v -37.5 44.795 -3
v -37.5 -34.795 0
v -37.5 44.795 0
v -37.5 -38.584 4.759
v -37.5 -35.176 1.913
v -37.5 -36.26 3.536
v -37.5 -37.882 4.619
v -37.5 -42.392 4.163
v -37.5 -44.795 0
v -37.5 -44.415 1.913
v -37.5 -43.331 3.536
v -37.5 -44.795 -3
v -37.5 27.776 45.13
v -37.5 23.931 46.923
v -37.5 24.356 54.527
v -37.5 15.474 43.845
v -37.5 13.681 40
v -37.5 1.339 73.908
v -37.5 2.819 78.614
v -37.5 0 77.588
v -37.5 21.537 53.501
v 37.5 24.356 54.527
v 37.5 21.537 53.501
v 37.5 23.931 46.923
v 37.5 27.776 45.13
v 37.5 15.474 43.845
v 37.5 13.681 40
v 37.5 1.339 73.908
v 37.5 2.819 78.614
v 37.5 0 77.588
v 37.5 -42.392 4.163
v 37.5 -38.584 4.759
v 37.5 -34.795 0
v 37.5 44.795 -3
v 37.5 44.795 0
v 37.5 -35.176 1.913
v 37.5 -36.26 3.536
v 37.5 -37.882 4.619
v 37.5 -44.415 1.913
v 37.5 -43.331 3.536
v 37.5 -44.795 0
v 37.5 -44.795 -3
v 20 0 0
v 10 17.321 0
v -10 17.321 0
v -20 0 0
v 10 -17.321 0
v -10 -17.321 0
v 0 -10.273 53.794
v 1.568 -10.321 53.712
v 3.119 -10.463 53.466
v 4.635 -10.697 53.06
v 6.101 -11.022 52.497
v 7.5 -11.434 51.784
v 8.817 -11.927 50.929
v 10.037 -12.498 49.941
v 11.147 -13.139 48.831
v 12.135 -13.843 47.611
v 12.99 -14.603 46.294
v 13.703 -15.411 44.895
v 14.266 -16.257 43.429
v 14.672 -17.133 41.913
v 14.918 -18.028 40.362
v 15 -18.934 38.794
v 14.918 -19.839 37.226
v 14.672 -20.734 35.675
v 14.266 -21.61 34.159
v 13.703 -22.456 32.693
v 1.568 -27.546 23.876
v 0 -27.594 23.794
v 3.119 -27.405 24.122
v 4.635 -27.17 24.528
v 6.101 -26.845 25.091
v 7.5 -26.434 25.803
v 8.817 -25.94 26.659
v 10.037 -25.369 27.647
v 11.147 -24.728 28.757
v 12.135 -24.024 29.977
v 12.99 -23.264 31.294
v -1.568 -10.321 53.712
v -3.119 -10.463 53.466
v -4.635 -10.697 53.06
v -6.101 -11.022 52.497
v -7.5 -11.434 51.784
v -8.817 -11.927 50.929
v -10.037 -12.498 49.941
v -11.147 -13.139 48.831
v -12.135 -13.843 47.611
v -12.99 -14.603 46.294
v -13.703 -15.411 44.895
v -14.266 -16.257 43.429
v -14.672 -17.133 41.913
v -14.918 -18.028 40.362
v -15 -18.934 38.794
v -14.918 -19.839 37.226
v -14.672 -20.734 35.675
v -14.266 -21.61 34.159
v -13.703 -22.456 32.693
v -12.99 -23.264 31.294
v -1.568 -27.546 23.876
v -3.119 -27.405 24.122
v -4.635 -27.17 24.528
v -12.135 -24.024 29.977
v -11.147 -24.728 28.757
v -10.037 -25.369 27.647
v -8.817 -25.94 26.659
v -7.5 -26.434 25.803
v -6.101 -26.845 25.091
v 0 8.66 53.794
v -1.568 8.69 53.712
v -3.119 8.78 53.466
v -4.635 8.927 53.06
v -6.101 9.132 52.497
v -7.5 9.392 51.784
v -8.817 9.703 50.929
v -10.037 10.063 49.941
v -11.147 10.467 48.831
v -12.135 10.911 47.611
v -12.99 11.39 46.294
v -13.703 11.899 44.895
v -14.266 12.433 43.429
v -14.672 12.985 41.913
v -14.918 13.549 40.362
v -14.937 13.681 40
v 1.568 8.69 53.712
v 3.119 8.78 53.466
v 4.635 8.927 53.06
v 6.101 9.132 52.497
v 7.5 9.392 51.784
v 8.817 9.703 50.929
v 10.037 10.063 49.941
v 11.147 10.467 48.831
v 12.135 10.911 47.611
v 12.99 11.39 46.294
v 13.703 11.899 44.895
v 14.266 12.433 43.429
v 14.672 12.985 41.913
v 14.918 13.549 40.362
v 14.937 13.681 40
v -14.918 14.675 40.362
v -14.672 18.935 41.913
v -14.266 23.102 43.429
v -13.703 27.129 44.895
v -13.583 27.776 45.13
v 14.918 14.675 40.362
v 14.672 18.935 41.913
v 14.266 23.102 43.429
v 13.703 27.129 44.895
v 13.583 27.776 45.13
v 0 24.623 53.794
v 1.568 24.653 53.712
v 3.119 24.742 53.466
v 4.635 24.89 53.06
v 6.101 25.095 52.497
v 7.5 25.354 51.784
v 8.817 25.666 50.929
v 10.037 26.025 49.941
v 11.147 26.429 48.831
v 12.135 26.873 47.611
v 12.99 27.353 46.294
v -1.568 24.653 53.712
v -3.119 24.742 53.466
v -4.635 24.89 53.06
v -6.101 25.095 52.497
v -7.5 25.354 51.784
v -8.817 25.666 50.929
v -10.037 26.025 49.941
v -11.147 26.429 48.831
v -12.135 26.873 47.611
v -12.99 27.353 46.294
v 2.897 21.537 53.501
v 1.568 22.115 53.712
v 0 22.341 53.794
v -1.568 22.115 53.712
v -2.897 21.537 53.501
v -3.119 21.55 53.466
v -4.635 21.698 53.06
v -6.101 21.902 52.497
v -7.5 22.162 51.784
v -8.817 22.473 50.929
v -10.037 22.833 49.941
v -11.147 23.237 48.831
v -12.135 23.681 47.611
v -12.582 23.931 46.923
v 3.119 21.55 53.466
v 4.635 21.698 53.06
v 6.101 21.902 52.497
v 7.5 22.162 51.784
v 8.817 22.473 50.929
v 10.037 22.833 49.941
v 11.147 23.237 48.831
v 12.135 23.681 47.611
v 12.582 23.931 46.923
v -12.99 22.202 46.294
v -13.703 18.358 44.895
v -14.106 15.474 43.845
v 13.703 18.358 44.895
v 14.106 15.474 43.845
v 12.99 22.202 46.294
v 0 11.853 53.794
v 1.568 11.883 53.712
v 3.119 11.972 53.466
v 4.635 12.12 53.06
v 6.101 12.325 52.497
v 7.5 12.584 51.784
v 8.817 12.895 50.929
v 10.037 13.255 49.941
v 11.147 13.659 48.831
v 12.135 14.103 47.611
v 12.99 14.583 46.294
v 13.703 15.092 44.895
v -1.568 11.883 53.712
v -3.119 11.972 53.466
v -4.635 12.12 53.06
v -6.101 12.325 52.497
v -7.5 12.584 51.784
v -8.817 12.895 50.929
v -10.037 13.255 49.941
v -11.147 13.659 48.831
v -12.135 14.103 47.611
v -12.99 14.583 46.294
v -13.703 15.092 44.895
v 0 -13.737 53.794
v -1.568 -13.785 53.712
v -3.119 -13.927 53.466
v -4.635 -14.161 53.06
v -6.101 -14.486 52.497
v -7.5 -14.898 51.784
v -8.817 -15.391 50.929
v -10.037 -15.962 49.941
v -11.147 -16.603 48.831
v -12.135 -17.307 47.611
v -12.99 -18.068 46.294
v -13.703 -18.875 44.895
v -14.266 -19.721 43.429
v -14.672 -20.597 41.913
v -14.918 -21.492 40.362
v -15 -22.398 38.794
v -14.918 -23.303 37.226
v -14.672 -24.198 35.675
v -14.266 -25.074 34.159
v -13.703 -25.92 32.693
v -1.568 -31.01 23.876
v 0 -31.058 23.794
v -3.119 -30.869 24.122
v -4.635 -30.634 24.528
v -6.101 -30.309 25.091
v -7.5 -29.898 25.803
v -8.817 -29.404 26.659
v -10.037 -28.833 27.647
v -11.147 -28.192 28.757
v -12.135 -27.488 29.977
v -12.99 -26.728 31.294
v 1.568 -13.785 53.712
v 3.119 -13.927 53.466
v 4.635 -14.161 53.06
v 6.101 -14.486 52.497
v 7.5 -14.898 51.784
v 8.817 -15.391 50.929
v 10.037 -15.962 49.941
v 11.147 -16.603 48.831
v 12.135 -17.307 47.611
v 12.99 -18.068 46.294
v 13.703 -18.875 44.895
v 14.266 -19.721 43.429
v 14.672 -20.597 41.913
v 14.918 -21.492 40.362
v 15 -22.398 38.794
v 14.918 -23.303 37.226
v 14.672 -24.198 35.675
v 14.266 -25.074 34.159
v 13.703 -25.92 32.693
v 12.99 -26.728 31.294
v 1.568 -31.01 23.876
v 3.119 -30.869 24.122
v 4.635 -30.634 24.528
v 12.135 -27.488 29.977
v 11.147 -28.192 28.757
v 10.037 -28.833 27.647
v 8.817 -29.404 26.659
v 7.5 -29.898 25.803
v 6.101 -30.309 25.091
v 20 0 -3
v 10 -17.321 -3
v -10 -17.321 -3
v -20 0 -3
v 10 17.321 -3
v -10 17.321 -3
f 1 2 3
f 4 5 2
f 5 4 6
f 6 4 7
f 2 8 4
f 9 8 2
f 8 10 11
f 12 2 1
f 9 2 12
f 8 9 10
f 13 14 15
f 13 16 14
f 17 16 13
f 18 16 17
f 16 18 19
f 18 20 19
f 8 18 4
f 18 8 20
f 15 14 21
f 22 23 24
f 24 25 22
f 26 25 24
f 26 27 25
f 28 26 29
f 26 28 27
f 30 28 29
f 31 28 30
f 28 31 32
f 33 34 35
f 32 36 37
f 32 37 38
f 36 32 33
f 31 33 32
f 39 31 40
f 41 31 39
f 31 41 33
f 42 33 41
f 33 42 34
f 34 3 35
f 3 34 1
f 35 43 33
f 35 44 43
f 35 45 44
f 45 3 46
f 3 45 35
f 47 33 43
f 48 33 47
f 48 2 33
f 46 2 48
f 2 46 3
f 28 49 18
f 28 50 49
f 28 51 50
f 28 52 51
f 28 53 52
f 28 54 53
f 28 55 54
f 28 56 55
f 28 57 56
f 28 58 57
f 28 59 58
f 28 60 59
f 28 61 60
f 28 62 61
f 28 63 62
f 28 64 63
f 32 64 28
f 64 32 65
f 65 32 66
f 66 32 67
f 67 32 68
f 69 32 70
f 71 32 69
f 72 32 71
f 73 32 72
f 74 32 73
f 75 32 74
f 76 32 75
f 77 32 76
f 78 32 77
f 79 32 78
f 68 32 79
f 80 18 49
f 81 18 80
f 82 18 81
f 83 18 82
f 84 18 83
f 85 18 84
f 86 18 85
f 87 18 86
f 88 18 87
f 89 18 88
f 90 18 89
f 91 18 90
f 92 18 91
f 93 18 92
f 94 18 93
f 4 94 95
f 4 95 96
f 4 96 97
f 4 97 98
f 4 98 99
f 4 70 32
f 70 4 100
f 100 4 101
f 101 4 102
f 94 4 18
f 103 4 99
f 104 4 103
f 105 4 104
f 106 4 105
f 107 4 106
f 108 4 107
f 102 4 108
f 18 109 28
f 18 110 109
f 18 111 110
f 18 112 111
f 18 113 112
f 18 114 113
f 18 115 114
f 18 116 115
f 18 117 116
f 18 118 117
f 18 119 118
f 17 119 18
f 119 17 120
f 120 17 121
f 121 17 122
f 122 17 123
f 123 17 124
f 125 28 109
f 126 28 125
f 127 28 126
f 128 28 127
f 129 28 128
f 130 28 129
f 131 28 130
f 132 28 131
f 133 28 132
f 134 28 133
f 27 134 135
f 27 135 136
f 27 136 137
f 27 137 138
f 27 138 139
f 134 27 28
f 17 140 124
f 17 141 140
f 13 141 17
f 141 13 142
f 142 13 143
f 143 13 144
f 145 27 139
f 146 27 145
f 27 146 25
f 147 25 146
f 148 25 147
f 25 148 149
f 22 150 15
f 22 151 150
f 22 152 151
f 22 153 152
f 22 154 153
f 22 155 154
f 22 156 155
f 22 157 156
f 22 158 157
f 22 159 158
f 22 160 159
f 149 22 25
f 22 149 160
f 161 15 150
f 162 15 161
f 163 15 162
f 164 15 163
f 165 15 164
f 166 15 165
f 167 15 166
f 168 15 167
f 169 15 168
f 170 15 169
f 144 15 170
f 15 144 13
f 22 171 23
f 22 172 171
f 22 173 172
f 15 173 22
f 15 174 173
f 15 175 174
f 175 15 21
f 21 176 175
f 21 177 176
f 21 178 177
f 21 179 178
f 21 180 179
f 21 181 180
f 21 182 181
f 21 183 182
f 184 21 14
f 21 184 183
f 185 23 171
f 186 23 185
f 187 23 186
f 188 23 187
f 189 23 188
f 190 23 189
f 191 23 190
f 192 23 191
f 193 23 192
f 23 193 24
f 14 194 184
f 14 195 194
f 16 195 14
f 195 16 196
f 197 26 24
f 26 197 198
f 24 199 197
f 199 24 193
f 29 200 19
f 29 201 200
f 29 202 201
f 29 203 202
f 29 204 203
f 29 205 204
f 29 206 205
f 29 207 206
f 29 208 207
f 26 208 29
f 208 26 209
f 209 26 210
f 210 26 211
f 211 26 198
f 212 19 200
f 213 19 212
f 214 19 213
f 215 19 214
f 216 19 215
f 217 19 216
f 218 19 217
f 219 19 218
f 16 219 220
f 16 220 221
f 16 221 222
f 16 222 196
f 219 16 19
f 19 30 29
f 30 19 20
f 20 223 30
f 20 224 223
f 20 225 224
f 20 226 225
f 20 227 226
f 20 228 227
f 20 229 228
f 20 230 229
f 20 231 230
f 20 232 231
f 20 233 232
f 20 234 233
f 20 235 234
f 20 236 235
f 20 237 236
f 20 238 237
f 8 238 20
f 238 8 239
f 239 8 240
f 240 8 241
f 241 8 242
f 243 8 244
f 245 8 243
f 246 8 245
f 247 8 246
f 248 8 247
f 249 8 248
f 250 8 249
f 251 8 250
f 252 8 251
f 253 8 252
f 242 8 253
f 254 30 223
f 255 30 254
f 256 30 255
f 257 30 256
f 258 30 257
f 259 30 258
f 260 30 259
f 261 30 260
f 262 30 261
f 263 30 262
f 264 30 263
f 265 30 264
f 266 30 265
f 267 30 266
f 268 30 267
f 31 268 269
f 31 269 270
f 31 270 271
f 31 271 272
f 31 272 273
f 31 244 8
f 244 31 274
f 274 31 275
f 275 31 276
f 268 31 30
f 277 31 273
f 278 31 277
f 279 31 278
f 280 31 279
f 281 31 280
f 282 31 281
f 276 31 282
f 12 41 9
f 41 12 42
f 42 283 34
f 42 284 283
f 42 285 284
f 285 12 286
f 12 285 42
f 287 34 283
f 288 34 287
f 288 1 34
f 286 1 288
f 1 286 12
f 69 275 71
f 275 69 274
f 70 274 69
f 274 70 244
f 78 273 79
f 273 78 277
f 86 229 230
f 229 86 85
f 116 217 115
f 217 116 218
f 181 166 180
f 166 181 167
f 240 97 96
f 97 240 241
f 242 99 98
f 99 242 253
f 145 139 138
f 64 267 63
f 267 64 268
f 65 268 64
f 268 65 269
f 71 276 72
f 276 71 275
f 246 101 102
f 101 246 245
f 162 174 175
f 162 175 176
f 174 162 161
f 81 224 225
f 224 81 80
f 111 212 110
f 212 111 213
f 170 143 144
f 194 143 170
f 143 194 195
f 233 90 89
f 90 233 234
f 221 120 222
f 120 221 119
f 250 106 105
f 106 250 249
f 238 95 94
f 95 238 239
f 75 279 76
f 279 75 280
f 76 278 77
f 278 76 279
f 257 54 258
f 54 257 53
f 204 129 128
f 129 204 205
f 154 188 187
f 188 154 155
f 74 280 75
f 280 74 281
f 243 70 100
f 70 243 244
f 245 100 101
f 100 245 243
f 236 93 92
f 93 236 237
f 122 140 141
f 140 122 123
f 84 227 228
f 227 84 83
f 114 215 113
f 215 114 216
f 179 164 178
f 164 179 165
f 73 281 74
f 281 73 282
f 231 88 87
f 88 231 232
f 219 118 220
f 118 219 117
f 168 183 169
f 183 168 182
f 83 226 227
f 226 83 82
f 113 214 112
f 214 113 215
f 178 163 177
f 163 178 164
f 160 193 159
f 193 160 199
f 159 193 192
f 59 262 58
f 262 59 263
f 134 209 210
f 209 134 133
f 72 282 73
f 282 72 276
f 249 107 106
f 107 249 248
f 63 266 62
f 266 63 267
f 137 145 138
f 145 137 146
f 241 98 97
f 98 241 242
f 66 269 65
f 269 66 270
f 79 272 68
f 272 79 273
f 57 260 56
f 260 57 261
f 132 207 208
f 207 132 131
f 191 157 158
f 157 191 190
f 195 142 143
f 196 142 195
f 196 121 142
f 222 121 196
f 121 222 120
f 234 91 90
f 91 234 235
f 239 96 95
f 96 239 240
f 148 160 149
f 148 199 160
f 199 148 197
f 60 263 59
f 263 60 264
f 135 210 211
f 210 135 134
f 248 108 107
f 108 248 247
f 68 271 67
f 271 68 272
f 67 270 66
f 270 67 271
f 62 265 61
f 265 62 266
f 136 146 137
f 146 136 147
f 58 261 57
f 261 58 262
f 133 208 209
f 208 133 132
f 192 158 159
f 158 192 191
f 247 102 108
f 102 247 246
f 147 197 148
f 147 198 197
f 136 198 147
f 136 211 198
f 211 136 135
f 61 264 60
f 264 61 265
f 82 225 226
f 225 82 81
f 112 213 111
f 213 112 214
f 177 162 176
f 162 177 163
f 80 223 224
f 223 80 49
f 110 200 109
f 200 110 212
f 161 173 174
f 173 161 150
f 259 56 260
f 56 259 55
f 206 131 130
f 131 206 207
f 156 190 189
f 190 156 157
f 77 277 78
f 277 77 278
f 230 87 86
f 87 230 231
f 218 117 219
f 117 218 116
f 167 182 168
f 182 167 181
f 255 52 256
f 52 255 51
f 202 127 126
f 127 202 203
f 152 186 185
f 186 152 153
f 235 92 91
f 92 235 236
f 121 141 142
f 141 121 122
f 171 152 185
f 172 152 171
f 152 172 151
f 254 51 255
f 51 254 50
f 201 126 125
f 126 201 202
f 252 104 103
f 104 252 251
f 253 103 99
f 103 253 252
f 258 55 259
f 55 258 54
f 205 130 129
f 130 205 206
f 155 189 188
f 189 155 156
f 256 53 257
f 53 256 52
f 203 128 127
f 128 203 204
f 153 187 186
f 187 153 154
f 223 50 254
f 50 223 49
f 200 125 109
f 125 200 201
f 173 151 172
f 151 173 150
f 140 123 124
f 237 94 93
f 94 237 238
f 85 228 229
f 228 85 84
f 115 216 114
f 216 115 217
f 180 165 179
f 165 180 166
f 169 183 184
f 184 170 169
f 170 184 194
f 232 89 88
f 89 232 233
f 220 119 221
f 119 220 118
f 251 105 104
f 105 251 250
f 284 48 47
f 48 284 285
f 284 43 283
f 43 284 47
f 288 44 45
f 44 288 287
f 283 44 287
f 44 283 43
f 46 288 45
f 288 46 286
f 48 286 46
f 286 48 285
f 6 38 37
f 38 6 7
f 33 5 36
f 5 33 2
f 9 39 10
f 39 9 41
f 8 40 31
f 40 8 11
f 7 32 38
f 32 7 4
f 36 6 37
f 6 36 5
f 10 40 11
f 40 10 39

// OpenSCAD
//!OpenSCAD
// radius of the main holer
Hole_radius = 15;
//roundness of the main hole
Hole_sides = 60;
// width of the phone in mm
width = 75;
// length of the grabber inmm
Phone_grabber_length = 10;
//thivkness of your phone+ tolerance + material thickness
Phone_thickness = 12;
// Length of theplug+ cablecurve length
Plug_length = 40;
//length of the holder
Holder_length = 40;
// angle of the back side
Angle = 60;
//Angle of the phone
Phone_Angle = 110;
// thickness of the material used inmm
Material_thickness = 3;
//radius of the hole inthe base
Base_hole_radius = 20;
// sides of thebase hole
Base_hole_sides = 6;
Side_length = (sin(Phone_Angle) * (Holder_length * 1) + Plug_length) / sin(Angle);


union(){
  difference() {
    rotate([0, 90, 0]){
      translate([0, (Side_length / -2), (width / -2)]){
        difference() {
          linear_extrude( height=width, twist=0, scale=[1, 1], center=false){
            union(){
              square([Material_thickness, Side_length], center=false);
              rotate([0, 0, Angle]){
                square([Material_thickness, Side_length], center=false);
              }
              translate([(sin(Angle) * (Side_length * -1) - sin(Phone_Angle) * (Holder_length * -1)), (cos(Angle) * Side_length + cos(Phone_Angle) * (Holder_length * -1)), 0]){
                rotate([0, 0, Phone_Angle]){
                  union(){
                    square([Material_thickness, Holder_length], center=false);
                    union(){
                      translate([Phone_thickness, 0, 0]){
                        rotate([0, 0, 90]){
                          square([Material_thickness, Phone_thickness], center=false);
                        }
                      }
                      translate([(Phone_thickness * 1), (Material_thickness * 0), 0]){
                        rotate([0, 0, 0]){
                          square([Material_thickness, Phone_grabber_length], center=false);
                        }
                      }
                    }
                  }
                }
              }
            }
          }

          translate([((sin(Phone_Angle) * (Holder_length * 1) + Plug_length) / -2), 0, (width / 2)]){
            rotate([90, 0, 0]){
              {
                $fn=Hole_sides;    //set sides to Hole_sides
                cylinder(r1=Hole_radius, r2=Hole_radius, h=20000, center=true);
              }
            }
          }
        }
      }
    }

    {
      $fn=Base_hole_sides;    //set sides to Base_hole_sides
      cylinder(r1=Base_hole_radius, r2=Base_hole_radius, h=10, center=true);
    }
  }
  difference() {
    translate([0, (Side_length / -2 + 5), 0]){
      rotate([0, 90, 0]){
        cylinder(r1=5, r2=5, h=width, center=true);
      }
    }

    translate([-500, -500, -11]){
      cube([1000, 1000, 10], center=false);
    }
  }
}
